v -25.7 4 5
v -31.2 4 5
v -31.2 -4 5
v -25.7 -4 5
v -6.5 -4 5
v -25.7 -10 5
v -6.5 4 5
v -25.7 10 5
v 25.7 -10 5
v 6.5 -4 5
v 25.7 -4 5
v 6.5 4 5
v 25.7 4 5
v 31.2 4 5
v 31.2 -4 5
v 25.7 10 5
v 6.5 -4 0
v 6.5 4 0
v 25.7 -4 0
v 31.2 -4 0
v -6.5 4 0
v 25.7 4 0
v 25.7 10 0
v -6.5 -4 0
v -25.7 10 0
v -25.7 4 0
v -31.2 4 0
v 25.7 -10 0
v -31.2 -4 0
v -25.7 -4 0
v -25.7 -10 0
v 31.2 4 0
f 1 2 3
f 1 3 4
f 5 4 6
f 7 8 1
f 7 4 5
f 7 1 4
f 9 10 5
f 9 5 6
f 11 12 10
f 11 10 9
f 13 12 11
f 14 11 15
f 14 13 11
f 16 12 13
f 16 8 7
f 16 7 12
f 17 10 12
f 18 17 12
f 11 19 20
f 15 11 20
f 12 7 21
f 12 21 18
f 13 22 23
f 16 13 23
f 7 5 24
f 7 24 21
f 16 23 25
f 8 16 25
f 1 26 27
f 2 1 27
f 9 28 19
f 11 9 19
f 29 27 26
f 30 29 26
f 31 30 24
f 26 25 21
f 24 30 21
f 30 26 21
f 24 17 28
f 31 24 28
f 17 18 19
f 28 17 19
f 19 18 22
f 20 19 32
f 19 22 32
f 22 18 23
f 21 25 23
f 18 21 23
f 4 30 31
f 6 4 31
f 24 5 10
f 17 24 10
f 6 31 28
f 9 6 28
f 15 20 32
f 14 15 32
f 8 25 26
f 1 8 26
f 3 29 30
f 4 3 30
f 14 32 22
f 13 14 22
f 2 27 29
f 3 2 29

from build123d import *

# Parameters (mm, degrees)
BOSS_EXTRUDE1_DEPTH = 5
SKETCH2_W           = 13
SKETCH2_H           = 8
CUT_EXTRUDE1_DEPTH  = 5


with BuildPart() as part:
    # Sketch1 → Boss-Extrude1 (new body)
    with BuildSketch(Plane.XY):
        Polygon((25.7, 10), (-25.7, 10), (-25.7, 4), (-31.2, 4), (-31.2, -4), (-25.7, -4), (-25.7, -10), (25.7, -10), (25.7, -4), (31.2, -4), (31.2, 4), (25.7, 4), align=None)
    extrude(amount=BOSS_EXTRUDE1_DEPTH)

    # Sketch2 → Cut-Extrude1 (cut)
    with BuildSketch(Plane.XY.offset(5)):
        Rectangle(SKETCH2_W, SKETCH2_H)
    extrude(amount=-CUT_EXTRUDE1_DEPTH, mode=Mode.SUBTRACT)


solid = part.part
